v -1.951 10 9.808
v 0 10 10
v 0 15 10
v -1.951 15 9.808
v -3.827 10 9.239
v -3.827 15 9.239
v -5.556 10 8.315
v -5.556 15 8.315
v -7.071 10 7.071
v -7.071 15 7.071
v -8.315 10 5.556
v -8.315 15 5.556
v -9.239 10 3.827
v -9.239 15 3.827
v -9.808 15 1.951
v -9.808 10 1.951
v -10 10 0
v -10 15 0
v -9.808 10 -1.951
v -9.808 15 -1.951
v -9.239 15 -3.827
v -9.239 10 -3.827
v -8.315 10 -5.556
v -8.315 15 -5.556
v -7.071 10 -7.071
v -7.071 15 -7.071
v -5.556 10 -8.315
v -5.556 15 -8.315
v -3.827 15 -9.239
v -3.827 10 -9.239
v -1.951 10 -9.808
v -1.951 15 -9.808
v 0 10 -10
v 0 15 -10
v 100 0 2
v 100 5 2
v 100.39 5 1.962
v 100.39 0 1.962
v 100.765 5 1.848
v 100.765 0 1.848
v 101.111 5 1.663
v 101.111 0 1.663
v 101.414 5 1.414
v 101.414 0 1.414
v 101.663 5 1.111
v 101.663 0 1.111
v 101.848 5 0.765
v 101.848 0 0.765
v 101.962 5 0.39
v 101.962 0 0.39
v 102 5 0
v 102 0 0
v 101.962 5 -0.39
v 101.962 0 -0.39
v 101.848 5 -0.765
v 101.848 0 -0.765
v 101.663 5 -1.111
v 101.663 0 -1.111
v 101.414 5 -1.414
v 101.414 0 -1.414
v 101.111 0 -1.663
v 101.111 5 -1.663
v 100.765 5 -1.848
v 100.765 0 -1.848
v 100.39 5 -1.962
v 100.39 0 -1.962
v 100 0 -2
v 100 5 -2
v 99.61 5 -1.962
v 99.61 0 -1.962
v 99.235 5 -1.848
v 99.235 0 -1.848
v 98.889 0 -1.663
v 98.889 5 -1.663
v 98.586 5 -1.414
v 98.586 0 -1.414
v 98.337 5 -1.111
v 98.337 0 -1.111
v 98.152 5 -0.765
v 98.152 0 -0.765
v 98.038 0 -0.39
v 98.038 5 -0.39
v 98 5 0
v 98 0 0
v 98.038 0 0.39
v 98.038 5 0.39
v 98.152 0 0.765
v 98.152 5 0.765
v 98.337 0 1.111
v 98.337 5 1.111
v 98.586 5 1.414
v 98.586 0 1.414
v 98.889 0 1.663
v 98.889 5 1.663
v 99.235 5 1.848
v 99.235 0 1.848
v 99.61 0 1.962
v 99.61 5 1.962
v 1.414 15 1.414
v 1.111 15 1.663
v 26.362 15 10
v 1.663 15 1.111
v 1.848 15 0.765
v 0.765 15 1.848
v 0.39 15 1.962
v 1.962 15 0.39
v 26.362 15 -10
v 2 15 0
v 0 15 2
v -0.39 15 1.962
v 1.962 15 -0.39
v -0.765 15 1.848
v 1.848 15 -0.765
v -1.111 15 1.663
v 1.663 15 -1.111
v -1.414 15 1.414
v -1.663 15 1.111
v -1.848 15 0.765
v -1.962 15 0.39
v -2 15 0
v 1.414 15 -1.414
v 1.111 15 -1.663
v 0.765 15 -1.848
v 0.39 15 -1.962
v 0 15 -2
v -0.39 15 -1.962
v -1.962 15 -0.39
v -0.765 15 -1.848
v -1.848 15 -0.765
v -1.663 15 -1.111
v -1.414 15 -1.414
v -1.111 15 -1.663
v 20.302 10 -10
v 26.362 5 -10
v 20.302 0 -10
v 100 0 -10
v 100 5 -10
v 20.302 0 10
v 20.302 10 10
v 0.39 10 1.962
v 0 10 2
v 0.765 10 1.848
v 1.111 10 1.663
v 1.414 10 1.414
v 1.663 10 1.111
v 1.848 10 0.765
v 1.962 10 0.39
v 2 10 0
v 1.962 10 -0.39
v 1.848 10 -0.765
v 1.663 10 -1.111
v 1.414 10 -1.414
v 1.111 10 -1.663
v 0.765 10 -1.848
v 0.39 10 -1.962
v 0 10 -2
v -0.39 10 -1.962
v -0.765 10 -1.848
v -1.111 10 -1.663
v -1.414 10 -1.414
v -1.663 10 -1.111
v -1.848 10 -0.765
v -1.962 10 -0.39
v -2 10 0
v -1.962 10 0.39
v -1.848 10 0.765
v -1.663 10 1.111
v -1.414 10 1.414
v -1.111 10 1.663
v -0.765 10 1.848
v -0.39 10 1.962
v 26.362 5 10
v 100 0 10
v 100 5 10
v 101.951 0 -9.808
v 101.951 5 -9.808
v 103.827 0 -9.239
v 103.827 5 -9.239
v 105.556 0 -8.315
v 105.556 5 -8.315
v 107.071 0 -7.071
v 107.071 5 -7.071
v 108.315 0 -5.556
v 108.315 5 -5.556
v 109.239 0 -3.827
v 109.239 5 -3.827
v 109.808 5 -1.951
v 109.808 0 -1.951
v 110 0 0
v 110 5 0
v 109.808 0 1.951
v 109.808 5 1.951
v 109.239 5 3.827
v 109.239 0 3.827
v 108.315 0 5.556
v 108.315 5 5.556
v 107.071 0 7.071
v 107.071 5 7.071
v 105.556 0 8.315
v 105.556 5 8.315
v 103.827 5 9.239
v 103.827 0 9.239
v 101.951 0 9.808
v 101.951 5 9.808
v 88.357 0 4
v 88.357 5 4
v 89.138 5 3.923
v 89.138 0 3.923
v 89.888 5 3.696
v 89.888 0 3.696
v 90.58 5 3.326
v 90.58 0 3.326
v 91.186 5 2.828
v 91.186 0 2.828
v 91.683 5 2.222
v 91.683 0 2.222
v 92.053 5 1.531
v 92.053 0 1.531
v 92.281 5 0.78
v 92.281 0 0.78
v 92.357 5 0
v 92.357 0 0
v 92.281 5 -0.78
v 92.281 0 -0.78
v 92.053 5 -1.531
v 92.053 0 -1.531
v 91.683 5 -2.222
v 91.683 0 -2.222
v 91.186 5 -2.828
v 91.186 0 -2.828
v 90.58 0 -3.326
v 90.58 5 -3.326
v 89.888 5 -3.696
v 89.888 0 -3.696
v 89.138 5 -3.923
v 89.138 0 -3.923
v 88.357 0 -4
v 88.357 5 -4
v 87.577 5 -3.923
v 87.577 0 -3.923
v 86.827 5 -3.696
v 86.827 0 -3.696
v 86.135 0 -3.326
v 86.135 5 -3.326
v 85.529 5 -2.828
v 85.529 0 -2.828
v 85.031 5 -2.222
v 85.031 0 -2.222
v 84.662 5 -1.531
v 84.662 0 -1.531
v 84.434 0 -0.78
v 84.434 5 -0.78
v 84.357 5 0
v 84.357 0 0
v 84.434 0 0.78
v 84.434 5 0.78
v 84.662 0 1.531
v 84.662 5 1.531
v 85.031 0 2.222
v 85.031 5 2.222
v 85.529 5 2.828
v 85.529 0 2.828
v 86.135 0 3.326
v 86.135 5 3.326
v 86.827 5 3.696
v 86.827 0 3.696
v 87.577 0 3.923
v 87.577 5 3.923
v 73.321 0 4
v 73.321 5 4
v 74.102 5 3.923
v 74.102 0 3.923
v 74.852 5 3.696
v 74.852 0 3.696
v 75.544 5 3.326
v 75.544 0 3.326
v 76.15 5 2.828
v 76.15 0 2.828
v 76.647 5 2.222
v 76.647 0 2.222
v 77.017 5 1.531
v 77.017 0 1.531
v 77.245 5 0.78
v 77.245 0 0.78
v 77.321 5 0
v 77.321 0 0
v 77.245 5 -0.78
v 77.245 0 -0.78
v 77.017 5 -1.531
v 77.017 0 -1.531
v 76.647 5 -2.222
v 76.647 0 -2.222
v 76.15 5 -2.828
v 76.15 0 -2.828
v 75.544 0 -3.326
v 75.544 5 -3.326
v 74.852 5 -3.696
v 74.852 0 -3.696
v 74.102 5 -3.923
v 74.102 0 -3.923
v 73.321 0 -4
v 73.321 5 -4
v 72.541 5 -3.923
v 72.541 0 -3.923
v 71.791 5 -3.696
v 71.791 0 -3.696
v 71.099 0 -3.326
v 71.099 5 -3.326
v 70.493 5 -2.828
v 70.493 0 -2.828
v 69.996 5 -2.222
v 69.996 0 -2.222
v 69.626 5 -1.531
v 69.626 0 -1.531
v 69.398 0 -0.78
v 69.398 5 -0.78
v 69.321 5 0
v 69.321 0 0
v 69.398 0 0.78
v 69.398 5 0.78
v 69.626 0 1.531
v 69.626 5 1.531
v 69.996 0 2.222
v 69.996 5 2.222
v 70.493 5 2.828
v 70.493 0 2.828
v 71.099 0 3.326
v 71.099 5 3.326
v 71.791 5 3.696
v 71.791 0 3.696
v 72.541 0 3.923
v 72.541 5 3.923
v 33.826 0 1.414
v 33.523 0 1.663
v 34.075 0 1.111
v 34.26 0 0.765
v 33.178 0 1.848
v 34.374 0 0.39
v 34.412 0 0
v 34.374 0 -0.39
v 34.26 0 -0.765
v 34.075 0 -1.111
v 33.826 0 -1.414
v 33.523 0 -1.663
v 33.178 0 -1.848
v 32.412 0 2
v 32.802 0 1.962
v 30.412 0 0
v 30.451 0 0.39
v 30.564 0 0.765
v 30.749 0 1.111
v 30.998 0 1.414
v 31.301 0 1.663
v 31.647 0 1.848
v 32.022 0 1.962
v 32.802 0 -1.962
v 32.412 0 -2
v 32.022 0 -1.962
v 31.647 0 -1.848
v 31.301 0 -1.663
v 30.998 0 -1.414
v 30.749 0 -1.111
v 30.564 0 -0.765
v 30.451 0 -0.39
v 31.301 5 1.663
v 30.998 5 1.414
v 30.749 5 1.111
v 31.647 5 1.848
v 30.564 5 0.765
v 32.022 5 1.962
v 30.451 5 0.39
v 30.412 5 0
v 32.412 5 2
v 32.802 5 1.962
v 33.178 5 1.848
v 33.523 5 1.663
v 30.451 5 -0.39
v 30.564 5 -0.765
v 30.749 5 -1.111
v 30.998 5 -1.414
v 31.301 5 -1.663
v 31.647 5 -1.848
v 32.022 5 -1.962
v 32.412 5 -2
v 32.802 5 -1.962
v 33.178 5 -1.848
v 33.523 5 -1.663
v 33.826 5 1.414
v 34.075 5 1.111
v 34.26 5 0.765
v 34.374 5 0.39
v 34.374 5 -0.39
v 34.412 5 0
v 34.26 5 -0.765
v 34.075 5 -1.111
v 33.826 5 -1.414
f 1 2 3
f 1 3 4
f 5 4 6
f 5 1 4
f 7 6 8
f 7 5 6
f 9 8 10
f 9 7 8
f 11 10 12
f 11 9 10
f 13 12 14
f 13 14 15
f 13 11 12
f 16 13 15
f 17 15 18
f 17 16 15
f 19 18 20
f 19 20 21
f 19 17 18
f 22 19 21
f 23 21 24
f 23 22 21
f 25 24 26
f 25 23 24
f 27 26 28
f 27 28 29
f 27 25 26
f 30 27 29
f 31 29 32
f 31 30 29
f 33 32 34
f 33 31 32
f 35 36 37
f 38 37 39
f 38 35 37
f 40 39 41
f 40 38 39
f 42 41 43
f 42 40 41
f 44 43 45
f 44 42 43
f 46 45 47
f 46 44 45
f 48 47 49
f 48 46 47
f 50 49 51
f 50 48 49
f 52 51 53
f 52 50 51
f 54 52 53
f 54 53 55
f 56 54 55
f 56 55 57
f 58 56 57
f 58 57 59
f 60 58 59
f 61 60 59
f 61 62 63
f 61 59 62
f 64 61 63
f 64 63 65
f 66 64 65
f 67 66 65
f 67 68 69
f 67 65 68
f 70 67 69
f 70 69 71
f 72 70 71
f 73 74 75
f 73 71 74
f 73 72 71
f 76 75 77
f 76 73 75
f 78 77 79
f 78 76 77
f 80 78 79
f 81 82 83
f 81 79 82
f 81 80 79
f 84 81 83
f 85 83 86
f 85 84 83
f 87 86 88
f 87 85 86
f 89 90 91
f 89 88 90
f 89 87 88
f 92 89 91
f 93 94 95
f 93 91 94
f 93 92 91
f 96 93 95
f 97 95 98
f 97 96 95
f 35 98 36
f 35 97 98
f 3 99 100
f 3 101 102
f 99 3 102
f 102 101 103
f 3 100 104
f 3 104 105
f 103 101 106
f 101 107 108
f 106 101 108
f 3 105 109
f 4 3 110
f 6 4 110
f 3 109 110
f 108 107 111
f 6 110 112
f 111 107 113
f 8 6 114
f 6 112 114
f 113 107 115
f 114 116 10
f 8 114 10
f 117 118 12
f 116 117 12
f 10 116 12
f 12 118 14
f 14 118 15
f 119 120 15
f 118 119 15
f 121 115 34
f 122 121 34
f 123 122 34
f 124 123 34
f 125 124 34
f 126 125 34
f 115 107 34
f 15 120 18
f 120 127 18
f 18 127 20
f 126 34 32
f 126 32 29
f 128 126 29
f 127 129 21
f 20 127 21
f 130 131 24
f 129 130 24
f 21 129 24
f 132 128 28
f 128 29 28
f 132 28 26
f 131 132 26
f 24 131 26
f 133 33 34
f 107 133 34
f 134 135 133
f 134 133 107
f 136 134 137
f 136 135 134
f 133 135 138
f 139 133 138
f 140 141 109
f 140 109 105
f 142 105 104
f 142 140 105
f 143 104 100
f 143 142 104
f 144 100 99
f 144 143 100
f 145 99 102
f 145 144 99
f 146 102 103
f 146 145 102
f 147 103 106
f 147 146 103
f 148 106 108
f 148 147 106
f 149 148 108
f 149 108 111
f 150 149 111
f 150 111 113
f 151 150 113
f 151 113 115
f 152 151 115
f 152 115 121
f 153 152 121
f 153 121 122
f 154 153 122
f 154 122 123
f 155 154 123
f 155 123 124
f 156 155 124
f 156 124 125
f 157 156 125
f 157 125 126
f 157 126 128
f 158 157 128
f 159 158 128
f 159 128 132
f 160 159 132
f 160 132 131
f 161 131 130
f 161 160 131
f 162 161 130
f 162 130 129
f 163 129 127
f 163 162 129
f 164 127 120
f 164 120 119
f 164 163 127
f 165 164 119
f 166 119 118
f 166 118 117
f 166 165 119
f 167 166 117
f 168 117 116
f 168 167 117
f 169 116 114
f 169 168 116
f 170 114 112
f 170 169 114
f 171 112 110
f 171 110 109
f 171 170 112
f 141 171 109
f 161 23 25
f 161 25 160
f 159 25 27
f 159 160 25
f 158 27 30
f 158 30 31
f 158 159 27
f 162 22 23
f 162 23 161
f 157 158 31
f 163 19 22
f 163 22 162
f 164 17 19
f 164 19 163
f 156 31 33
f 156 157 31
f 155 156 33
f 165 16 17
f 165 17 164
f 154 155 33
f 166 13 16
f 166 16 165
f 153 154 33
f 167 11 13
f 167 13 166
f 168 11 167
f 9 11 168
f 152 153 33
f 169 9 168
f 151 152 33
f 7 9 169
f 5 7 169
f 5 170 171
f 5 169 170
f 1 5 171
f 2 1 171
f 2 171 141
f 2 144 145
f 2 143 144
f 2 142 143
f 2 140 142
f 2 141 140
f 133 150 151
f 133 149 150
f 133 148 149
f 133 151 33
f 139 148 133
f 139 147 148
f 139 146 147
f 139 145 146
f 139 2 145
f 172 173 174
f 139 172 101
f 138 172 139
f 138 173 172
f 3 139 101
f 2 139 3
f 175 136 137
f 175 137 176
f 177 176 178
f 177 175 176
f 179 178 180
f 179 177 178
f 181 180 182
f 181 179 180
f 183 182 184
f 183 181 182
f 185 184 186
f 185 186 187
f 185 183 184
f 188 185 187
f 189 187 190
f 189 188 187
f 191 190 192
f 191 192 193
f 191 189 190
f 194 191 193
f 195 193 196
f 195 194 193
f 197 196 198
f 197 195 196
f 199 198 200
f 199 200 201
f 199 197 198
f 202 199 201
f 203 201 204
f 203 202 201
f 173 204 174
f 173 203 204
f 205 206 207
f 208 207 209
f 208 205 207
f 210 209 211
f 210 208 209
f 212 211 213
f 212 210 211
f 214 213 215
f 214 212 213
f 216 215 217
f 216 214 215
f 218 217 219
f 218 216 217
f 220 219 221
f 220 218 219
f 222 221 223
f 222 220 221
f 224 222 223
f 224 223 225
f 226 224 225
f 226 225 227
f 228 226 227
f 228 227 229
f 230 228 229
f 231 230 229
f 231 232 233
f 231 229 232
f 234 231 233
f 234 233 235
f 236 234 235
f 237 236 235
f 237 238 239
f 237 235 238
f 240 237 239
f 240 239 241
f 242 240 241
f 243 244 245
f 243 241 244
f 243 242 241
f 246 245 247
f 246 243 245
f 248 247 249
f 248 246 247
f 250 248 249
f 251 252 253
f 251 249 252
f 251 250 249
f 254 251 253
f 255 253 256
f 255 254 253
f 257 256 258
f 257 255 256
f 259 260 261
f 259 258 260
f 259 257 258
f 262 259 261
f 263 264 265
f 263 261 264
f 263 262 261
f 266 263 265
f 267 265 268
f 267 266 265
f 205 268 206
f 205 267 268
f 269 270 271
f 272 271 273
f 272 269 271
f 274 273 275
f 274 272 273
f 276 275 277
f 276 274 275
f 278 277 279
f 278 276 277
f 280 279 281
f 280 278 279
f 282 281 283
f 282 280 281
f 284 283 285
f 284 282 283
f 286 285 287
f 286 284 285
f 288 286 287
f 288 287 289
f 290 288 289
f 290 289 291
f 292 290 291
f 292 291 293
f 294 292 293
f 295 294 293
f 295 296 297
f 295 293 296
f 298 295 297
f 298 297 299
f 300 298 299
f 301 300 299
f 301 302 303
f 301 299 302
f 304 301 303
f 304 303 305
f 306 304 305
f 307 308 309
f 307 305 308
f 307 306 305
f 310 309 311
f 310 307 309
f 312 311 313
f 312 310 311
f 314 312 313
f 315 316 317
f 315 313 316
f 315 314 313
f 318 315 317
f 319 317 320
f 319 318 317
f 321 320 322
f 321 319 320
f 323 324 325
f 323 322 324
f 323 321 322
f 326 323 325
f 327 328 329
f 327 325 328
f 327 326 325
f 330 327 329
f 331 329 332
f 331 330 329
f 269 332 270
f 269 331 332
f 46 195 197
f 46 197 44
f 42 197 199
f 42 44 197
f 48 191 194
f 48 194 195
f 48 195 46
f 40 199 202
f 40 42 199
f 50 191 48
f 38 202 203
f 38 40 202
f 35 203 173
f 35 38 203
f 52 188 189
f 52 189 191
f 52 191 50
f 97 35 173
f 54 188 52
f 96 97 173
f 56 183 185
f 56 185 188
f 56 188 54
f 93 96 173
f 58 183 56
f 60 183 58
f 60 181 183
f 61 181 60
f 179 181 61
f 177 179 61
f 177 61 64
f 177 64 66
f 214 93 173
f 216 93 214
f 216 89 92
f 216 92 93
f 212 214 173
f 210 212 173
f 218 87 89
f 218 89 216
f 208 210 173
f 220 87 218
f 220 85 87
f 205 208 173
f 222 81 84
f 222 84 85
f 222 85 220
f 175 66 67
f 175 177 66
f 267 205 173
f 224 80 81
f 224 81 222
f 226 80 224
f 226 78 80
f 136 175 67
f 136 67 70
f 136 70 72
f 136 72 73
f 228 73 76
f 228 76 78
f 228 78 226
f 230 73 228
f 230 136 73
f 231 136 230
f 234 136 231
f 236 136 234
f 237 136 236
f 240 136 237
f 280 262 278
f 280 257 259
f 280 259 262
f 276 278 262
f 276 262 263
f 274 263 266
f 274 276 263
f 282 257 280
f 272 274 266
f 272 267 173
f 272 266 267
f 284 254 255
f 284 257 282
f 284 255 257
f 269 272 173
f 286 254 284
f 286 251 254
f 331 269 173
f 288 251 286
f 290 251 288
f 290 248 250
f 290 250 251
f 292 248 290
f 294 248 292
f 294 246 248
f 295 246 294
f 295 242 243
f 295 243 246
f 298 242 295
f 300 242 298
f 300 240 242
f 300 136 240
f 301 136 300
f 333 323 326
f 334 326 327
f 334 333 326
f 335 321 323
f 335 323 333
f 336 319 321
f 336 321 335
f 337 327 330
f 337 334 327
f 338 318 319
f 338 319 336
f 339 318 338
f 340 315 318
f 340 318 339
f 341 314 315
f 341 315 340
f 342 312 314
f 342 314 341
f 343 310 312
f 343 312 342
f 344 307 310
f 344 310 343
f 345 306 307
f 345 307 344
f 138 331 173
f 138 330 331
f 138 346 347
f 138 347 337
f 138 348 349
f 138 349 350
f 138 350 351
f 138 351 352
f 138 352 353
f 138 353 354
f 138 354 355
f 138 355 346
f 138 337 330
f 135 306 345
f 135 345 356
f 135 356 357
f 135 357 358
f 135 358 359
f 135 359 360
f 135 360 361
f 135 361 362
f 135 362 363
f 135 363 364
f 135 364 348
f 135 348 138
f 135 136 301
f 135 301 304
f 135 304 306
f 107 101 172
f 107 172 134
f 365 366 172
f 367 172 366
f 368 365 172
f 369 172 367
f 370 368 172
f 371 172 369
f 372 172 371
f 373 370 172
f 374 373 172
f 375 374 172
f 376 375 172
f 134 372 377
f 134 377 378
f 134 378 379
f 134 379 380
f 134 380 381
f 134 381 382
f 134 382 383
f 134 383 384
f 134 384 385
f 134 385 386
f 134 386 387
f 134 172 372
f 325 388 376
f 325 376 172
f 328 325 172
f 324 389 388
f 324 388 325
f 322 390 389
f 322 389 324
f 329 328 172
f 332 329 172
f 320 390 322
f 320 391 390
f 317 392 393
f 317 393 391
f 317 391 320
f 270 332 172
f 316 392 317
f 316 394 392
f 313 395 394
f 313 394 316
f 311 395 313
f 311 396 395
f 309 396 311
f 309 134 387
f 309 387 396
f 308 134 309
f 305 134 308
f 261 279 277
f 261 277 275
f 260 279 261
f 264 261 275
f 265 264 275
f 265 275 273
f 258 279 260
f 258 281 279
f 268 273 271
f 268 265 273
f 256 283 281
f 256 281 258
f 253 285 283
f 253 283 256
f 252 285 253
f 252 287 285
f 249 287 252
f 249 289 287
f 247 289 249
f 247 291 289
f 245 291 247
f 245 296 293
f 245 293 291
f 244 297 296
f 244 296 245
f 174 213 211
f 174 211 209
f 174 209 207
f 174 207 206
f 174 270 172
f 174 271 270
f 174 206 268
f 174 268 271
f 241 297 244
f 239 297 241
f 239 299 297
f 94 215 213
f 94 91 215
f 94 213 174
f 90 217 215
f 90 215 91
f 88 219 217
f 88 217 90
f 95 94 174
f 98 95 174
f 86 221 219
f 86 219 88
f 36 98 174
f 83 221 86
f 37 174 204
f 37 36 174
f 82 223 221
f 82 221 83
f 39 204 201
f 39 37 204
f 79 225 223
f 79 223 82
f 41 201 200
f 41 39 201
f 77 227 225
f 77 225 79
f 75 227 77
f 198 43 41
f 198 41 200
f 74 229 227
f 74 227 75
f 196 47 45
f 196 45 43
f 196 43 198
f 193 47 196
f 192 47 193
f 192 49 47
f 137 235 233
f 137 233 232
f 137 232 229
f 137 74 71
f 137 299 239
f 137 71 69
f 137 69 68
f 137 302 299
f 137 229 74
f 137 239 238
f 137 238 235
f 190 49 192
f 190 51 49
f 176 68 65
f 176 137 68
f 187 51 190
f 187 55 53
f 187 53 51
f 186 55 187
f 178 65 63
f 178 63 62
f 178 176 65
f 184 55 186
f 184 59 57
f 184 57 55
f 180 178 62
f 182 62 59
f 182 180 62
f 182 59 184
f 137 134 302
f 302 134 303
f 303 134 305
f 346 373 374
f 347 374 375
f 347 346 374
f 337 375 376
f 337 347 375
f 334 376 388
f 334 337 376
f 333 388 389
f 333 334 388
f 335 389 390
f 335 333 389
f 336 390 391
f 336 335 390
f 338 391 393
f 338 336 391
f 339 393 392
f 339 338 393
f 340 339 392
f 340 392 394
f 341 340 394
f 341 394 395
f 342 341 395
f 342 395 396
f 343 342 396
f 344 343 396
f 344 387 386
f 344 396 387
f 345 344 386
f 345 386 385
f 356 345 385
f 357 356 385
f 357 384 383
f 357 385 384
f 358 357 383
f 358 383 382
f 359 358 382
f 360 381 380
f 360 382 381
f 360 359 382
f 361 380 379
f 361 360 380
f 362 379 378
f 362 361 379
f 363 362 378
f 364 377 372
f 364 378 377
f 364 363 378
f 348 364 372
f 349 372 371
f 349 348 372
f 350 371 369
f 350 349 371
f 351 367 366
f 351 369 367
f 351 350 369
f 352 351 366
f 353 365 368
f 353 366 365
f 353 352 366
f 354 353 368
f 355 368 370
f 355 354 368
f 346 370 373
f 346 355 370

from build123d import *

# Parameters (mm, degrees)
SKETCH_2_R          = 2
SKETCH_2_R_2        = 4
EXTRUDE_1_DEPTH     = 15
SKETCH_3_W          = 98.28308004
SKETCH_3_H          = 42.939209726
CUT_EXTRUDE_1_DEPTH = 10
SKETCH_4_W          = 17.609413282
SKETCH_4_H          = 10.32275951
EXTRUDE_2_DEPTH     = 15
SKETCH_5_W          = 36.098979715
SKETCH_5_H          = 26.284001105
CUT_EXTRUDE_2_DEPTH = 10


with BuildPart() as part:
    # 草图2 → 凸台-拉伸1 (new body)
    with BuildSketch(Plane(origin=(0, 0, 0), x_dir=(1, 0, 0), z_dir=(0, 1, 0))):
        with BuildLine():
            Line((0, 10), (100, 10))
            ThreePointArc((100, 10), (110, 0), (100, -10))
            Line((100, -10), (0, -10))
            ThreePointArc((0, -10), (-10, 0), (0, 10))
        make_face()
        with Locations(Location((0, 0, 0), (0, 0, 270))):
            Circle(SKETCH_2_R, mode=Mode.SUBTRACT)
        with Locations(Location((10.16682634, 0, 0), (0, 0, 270))):
            Circle(SKETCH_2_R, mode=Mode.SUBTRACT)
        with Locations(Location((20.833686735, 0, 0), (0, 0, 270))):
            Circle(SKETCH_2_R, mode=Mode.SUBTRACT)
        with Locations(Location((32.412244599, 0, 0), (0, 0, 270))):
            Circle(SKETCH_2_R, mode=Mode.SUBTRACT)
        with Locations(Location((100, 0, 0), (0, 0, 270))):
            Circle(SKETCH_2_R, mode=Mode.SUBTRACT)
        with Locations(Location((88.357359208, 0, 0), (0, 0, 270))):
            Circle(SKETCH_2_R_2, mode=Mode.SUBTRACT)
        with Locations(Location((73.321402027, 0, 0), (0, 0, 270))):
            Circle(SKETCH_2_R_2, mode=Mode.SUBTRACT)
    extrude(amount=EXTRUDE_1_DEPTH)

    # 草图3 → 切除-拉伸1 (cut)
    with BuildSketch(Plane(origin=(0, 15, 0), x_dir=(1, 0, 0), z_dir=(0, 1, 0))):
        with Locations((75.503288201, -4.727650364)):
            Rectangle(SKETCH_3_W, SKETCH_3_H)
    extrude(amount=-CUT_EXTRUDE_1_DEPTH, mode=Mode.SUBTRACT)

    # 草图4 → 凸台-拉伸2 (add)
    with BuildSketch(Plane(origin=(0, 15, 0), x_dir=(1, 0, 0), z_dir=(0, 1, 0))):
        with Locations((15.041411071, 0.216864696)):
            Rectangle(SKETCH_4_W, SKETCH_4_H)
    extrude(amount=-EXTRUDE_2_DEPTH)

    # 草图5 → 切除-拉伸2 (cut)
    with BuildSketch(Plane.XZ):
        with Locations((2.252741217, 0.303610574)):
            Rectangle(SKETCH_5_W, SKETCH_5_H)
    extrude(amount=-CUT_EXTRUDE_2_DEPTH, mode=Mode.SUBTRACT)


solid = part.part
